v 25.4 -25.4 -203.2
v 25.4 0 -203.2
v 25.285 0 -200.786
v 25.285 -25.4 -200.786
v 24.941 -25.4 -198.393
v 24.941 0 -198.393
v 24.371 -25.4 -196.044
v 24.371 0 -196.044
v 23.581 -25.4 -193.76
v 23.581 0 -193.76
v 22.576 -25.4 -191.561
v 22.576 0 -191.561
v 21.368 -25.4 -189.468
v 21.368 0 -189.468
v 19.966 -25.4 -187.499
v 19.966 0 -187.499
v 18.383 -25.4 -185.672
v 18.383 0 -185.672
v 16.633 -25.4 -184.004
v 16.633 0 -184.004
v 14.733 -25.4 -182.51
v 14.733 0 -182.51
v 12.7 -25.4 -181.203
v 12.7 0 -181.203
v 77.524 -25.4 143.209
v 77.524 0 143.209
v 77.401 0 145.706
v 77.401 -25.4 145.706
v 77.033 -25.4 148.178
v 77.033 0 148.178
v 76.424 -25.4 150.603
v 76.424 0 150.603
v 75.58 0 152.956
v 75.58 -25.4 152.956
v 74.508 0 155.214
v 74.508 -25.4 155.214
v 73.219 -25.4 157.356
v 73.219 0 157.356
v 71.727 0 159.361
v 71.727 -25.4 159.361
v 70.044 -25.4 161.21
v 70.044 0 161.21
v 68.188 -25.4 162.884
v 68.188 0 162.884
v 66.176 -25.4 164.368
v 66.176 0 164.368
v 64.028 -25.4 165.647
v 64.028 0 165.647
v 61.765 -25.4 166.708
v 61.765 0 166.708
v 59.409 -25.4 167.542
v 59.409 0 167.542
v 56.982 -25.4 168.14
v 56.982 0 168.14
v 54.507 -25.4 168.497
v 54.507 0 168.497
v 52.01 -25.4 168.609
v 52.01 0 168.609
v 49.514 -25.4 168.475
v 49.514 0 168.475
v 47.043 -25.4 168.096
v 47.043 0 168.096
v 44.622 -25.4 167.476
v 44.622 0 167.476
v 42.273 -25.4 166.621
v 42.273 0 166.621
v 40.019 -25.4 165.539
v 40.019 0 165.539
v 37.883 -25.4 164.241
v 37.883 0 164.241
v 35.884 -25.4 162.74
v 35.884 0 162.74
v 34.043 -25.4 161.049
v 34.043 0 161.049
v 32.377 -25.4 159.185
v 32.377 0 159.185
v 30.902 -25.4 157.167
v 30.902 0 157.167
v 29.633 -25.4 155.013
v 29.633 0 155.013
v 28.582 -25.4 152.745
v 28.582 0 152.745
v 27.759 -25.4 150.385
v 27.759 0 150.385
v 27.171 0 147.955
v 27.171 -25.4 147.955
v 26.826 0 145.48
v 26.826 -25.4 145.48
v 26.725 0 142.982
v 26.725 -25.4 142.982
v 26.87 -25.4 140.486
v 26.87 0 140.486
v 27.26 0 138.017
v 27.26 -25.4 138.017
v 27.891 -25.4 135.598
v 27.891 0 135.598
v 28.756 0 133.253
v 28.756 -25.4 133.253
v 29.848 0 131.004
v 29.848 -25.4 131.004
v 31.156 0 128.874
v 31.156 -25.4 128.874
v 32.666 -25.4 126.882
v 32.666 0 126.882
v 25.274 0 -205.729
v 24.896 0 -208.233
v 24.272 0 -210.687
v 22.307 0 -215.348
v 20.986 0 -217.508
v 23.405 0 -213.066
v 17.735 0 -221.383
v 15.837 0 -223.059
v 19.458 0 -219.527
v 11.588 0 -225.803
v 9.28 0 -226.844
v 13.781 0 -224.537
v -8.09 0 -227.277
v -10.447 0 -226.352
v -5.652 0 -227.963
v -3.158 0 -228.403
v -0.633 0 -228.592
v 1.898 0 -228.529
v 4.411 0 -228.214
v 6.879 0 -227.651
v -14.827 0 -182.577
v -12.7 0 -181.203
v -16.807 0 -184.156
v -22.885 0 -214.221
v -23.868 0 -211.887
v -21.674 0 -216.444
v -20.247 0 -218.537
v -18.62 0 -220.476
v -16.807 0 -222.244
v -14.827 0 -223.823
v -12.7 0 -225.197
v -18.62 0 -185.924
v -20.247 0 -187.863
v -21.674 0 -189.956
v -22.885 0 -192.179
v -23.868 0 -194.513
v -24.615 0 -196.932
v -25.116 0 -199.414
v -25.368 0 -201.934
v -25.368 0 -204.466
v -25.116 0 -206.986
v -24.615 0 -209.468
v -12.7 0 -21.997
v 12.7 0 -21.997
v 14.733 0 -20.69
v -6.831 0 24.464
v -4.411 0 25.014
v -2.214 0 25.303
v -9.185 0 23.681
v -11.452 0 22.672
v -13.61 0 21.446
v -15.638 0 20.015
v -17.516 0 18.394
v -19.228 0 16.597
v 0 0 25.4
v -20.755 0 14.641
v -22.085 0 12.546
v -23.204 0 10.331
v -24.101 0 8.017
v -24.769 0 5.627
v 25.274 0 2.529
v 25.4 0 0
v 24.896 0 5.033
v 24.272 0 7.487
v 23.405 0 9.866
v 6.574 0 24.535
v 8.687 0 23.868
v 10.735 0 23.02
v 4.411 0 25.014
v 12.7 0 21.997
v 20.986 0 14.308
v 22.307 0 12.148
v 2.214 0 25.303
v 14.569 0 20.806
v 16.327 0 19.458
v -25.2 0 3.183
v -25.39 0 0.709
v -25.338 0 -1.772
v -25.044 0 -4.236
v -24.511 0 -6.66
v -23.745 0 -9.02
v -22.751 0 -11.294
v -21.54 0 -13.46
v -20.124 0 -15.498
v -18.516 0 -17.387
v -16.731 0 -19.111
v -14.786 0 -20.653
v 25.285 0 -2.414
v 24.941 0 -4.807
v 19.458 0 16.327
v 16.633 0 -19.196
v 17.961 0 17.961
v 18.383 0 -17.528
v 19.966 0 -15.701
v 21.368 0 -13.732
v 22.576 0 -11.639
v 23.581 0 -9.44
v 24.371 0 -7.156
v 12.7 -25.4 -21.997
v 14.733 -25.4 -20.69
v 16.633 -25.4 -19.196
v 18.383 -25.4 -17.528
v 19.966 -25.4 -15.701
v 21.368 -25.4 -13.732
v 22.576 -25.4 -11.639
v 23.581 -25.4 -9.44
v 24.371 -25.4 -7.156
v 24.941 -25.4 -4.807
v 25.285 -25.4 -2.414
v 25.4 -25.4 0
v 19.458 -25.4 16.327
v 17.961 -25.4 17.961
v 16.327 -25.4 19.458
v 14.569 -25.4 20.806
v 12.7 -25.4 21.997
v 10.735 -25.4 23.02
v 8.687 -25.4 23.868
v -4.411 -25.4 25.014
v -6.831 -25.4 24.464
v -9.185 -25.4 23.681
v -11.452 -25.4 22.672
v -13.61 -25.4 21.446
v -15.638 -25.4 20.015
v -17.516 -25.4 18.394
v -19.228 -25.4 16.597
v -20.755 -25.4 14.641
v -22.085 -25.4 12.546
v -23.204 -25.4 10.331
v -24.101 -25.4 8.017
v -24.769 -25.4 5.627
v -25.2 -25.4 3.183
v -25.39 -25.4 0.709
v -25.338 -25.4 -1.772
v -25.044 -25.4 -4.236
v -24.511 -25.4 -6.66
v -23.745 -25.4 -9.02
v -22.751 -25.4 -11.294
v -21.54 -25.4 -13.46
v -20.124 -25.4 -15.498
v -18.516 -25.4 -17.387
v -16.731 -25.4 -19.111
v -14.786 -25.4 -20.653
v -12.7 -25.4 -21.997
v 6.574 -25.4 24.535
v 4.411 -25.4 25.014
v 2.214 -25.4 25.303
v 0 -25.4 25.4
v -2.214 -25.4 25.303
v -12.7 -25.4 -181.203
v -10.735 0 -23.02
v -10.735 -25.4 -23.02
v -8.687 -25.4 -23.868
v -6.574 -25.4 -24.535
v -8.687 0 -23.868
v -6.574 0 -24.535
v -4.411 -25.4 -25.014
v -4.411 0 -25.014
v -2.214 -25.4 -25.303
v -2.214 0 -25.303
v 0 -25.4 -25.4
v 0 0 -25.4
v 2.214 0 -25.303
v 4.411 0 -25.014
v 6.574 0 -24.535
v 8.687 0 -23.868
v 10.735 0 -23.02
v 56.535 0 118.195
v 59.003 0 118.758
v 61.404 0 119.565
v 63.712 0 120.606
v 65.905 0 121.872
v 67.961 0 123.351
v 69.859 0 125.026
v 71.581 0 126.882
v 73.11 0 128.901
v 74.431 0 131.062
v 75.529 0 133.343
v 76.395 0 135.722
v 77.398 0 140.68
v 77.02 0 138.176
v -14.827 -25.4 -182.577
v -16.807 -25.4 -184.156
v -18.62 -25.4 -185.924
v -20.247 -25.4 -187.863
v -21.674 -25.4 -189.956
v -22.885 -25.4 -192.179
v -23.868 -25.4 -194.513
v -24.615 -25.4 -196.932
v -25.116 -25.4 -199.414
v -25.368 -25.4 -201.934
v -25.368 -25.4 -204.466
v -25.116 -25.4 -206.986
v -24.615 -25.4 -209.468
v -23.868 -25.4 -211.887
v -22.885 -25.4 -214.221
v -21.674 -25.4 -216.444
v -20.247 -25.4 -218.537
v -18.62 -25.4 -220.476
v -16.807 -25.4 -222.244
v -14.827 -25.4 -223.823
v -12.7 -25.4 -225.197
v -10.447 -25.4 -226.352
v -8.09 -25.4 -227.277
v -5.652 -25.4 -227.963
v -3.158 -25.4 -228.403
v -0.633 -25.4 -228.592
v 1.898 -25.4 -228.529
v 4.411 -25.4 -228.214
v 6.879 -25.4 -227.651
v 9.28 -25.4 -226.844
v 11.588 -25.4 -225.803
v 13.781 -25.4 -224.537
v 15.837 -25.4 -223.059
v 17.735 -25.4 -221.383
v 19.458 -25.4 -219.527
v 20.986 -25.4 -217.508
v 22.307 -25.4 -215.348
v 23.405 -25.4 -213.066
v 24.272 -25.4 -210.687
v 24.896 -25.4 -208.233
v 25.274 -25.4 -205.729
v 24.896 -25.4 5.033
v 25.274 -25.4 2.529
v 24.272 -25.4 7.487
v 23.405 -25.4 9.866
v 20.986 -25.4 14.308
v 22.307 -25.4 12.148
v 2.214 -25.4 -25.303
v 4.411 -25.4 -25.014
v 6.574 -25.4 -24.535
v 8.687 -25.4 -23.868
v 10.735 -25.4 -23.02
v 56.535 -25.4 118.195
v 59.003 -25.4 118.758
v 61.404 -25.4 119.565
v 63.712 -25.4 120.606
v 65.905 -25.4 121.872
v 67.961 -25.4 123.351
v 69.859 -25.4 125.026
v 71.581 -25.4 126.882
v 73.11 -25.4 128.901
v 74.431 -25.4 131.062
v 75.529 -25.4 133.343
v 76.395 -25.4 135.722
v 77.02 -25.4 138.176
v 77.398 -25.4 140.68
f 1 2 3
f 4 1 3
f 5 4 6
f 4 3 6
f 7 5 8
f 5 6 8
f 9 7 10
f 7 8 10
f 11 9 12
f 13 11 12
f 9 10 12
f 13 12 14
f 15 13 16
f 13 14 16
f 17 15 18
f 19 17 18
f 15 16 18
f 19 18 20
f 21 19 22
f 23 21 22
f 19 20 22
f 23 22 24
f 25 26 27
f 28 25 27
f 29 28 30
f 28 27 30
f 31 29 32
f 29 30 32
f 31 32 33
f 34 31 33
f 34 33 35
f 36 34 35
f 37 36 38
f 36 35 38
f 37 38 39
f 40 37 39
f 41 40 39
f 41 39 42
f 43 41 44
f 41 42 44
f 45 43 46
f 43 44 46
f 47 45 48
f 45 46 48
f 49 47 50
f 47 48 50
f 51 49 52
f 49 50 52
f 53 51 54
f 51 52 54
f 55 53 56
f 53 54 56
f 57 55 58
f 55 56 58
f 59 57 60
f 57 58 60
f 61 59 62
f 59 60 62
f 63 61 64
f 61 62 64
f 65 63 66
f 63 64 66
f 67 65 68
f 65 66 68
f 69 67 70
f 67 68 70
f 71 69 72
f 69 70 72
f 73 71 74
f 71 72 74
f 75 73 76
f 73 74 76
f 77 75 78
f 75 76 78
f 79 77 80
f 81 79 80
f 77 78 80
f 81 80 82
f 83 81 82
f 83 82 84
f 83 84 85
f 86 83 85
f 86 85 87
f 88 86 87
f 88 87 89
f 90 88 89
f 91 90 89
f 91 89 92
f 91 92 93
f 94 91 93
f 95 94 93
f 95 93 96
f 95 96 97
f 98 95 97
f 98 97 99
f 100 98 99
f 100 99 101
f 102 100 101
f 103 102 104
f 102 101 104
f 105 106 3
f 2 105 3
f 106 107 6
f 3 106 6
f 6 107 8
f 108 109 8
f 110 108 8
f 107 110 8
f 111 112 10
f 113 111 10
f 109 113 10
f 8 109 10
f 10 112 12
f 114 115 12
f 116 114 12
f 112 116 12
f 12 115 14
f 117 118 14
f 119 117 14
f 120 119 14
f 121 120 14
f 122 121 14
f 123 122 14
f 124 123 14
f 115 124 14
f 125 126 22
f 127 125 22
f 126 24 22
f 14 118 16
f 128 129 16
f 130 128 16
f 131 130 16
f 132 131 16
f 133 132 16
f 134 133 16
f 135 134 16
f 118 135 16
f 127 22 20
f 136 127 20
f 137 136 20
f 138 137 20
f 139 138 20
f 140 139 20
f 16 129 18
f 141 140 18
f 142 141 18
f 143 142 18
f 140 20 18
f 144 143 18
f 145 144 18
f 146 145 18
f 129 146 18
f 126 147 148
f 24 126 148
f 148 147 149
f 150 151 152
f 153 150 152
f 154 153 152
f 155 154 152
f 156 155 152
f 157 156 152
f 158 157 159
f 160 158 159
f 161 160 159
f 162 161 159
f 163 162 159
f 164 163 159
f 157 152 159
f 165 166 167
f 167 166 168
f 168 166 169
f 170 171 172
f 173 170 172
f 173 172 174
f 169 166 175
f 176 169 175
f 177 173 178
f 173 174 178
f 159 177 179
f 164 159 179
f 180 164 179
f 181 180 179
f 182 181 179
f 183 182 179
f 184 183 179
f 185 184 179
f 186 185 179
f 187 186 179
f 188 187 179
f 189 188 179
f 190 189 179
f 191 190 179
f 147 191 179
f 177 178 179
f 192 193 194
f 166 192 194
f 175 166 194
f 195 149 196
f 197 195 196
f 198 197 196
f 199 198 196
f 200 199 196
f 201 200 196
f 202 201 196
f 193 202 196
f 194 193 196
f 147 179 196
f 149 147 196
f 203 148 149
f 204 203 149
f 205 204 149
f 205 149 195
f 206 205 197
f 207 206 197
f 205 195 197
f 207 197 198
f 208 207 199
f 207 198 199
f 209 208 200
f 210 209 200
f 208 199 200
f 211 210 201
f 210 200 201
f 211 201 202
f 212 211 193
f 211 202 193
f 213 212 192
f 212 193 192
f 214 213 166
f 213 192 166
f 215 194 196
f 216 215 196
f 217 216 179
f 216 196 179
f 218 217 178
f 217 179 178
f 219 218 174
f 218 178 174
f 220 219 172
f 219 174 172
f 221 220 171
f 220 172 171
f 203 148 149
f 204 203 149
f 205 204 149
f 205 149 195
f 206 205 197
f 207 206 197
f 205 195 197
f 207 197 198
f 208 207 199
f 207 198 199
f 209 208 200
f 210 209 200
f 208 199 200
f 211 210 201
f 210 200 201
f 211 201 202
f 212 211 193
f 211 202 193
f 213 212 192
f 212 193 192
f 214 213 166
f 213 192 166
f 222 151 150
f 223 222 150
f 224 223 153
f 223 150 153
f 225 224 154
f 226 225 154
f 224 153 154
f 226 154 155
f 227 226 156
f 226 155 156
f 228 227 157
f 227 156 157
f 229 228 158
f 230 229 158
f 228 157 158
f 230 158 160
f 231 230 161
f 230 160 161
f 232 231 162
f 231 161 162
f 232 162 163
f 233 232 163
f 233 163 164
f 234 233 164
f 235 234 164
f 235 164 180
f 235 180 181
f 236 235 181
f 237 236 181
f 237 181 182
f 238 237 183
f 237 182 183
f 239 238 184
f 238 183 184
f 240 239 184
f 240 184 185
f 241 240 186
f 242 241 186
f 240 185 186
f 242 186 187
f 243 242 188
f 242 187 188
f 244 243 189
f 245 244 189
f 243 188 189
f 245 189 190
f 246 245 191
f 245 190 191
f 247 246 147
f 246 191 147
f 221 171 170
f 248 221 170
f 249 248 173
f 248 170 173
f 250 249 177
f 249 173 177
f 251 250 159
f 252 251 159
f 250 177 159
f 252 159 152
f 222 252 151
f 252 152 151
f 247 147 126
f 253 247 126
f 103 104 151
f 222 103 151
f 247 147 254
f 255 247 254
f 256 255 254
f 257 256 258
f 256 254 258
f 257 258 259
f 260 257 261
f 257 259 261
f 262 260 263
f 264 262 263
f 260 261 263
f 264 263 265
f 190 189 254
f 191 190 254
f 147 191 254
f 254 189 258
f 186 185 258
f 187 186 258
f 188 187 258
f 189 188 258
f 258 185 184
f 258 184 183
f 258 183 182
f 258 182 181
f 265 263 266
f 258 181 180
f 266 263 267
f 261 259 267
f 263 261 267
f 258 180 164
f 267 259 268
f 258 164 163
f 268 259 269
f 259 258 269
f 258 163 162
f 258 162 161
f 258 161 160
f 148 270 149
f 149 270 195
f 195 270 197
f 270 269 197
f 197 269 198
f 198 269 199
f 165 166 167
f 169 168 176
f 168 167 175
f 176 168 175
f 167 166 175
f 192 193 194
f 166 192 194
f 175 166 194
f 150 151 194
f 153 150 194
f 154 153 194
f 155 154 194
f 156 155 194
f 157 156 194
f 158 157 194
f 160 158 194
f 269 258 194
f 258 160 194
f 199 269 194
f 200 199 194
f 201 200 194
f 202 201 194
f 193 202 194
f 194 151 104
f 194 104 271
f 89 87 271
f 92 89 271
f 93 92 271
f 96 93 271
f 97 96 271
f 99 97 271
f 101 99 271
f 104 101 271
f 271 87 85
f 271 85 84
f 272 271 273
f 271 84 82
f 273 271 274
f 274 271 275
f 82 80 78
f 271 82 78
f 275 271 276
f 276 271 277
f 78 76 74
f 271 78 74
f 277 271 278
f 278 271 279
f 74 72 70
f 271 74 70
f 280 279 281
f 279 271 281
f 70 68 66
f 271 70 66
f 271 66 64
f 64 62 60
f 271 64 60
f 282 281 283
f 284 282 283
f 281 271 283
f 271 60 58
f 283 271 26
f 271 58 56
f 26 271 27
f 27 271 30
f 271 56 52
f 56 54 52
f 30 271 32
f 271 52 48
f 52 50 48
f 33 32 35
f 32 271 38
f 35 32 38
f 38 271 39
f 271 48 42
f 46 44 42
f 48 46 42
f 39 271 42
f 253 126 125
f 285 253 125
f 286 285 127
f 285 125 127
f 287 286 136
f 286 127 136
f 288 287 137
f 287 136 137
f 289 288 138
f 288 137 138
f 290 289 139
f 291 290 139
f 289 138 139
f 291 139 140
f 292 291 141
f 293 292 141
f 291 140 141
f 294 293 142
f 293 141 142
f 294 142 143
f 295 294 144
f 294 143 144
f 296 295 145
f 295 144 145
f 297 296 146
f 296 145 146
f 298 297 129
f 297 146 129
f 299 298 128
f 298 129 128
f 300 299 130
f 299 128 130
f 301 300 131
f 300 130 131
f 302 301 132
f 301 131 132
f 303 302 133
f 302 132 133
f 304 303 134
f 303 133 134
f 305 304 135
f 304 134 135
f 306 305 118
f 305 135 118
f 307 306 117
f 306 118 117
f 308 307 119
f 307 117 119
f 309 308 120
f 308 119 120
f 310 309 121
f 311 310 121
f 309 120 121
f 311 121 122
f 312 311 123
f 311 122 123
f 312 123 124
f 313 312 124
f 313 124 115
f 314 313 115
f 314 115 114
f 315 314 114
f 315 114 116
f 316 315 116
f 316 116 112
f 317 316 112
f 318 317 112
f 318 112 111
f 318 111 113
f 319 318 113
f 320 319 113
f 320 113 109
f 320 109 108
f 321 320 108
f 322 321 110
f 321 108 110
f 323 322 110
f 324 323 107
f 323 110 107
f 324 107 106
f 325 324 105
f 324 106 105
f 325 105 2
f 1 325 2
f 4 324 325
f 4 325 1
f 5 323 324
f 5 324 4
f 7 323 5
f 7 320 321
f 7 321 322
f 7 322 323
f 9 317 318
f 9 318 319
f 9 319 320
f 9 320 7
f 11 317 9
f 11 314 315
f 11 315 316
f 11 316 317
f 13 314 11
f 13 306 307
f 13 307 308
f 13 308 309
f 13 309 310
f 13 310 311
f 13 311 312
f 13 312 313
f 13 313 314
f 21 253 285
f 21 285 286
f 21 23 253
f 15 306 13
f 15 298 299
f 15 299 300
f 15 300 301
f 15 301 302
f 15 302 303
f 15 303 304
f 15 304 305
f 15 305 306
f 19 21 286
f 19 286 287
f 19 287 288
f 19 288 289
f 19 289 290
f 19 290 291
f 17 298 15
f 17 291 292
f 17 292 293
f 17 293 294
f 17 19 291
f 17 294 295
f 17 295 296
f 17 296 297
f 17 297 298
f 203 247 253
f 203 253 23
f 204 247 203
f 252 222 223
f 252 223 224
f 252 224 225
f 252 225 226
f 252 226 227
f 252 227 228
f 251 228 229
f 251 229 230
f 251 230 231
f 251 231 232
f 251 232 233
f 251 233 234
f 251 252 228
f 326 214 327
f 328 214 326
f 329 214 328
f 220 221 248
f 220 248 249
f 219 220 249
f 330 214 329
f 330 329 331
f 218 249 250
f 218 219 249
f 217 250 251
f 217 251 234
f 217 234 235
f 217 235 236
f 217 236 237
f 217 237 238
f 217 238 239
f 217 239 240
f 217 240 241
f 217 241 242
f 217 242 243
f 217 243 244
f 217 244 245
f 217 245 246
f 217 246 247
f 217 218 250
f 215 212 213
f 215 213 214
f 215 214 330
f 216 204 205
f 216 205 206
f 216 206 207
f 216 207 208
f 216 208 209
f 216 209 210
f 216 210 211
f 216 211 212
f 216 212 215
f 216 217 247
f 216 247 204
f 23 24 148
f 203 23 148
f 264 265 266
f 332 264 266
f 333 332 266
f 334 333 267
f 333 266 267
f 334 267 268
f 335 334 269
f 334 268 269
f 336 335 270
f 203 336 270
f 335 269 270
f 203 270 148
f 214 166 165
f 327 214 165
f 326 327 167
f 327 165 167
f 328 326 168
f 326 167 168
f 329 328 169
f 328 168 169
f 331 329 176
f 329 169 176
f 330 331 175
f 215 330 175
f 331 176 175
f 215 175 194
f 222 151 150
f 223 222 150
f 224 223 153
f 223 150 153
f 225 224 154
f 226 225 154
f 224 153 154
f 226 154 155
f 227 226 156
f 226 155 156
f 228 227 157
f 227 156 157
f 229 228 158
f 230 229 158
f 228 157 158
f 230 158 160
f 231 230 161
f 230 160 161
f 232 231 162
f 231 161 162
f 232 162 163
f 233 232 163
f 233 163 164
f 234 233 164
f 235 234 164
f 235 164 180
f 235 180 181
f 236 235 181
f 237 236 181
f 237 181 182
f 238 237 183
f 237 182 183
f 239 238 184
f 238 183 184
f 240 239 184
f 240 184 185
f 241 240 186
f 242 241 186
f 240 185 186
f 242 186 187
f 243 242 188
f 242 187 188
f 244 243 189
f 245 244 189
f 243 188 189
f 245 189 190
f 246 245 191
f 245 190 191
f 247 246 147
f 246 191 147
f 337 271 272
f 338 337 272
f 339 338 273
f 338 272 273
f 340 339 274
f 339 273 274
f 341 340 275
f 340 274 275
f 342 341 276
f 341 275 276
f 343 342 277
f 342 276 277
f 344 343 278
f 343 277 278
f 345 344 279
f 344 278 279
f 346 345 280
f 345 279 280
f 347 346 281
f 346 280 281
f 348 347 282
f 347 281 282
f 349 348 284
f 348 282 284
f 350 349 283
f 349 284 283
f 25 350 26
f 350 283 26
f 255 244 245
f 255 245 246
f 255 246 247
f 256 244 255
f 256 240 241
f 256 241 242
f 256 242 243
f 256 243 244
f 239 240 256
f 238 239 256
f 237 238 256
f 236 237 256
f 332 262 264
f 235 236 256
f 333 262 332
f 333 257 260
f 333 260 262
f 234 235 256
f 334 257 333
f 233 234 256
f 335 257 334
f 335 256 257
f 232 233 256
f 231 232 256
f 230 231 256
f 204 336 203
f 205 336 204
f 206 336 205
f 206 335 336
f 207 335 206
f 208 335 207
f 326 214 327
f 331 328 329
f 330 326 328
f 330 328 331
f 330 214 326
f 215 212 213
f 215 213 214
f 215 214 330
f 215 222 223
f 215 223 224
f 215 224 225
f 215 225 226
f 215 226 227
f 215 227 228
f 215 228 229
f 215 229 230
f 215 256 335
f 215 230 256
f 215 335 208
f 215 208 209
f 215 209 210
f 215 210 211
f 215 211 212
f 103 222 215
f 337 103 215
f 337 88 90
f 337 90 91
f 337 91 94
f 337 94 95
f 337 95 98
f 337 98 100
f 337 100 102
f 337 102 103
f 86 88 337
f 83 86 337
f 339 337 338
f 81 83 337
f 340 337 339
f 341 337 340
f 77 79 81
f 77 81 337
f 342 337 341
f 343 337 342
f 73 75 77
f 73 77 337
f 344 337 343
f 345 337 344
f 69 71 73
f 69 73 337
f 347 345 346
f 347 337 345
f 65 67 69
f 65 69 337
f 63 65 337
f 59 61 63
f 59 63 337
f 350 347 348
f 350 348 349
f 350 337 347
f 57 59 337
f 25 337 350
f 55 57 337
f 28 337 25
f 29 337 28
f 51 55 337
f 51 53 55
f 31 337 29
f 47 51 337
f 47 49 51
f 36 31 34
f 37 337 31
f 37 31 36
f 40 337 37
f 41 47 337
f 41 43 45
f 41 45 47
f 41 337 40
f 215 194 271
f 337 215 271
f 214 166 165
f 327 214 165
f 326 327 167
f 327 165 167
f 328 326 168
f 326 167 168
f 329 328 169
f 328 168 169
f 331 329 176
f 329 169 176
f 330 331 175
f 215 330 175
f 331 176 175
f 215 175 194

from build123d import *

# Parameters (mm, degrees)
F1_DEPTH = 25.4
F2_DEPTH = 25.4


with BuildPart() as f1:
    # F0 (on Front) → F1 (new body)
    with BuildSketch(Plane.XZ):
        with BuildLine():
            Line((12.7, -181.2029547439), (12.7, -21.9970452561))
            ThreePointArc((12.7, -21.9970452561), (6.5740037456, -24.5345159877), (0, -25.4))
            Line((0, -25.4), (0, -177.8))
            ThreePointArc((0, -177.8), (6.5740037456, -178.6654840123), (12.7, -181.2029547439))
        make_face()
        with BuildLine():
            ThreePointArc((25.4, -203.2), (21.9970452561, -190.5), (12.7, -181.2029547439))
            ThreePointArc((12.7, -181.2029547439), (6.5740037456, -178.6654840123), (0, -177.8))
            ThreePointArc((0, -177.8), (-6.5740037456, -178.6654840123), (-12.7, -181.2029547439))
            ThreePointArc((-12.7, -181.2029547439), (-12.7, -225.1970452561), (25.4, -203.2))
        make_face()
        with BuildLine():
            Line((0, -177.8), (0, -25.4))
            ThreePointArc((0, -25.4), (-6.5740037456, -24.5345159877), (-12.7, -21.9970452561))
            Line((-12.7, -21.9970452561), (-12.7, -181.2029547439))
            ThreePointArc((-12.7, -181.2029547439), (-6.5740037456, -178.6654840123), (0, -177.8))
        make_face()
        with BuildLine():
            Line((12.7, -2.239352655), (19.4575288552, 16.326805286))
            ThreePointArc((19.4575288552, 16.326805286), (14.5688414833, 20.8064619249), (8.6873116405, 23.868192568))
            Line((8.6873116405, 23.868192568), (0, 0))
            Line((0, 0), (0, -25.4))
            ThreePointArc((0, -25.4), (6.5740037456, -24.5345159877), (12.7, -21.9970452561))
            Line((12.7, -21.9970452561), (12.7, -2.239352655))
        make_face()
        with BuildLine():
            Line((0, 0), (8.6873116405, 23.868192568))
            ThreePointArc((8.6873116405, 23.868192568), (2.2137558658, 25.3033453315), (-4.4106637127, 25.0141169265))
            ThreePointArc((-4.4106637127, 25.0141169265), (-25.0141169265, 4.4106637127), (-12.7, -21.9970452561))
            ThreePointArc((-12.7, -21.9970452561), (-6.5740037456, -24.5345159877), (0, -25.4))
            Line((0, -25.4), (0, 0))
        make_face()
        with BuildLine():
            ThreePointArc((12.7, -21.9970452561), (21.9970452561, -12.7), (25.4, 0))
            ThreePointArc((25.4, 0), (23.868192568, 8.6873116405), (19.4575288552, 16.326805286))
            Line((19.4575288552, 16.326805286), (12.7, -2.239352655))
            Line((12.7, -2.239352655), (12.7, -21.9970452561))
        make_face()
    extrude(amount=F1_DEPTH)


with BuildPart() as f2:
    # F0 (on Front) → F2 (new body)
    with BuildSketch(Plane.XZ):
        with BuildLine():
            ThreePointArc((43.4365582024, 119.3409628398), (49.910113977, 117.9058100762), (56.5345335556, 118.1950384813))
            ThreePointArc((56.5345335556, 118.1950384813), (71.5813986981, 126.8823501217), (77.5238698428, 143.2091554078))
            ThreePointArc((77.5238698428, 143.2091554078), (43.4365582024, 167.0773479757), (32.6663409876, 126.8823501217))
            ThreePointArc((32.6663409876, 126.8823501217), (37.5550283595, 122.4026934828), (43.4365582024, 119.3409628398))
        make_face()
        with BuildLine():
            ThreePointArc((8.6873116405, 23.868192568), (14.5688414833, 20.8064619249), (19.4575288552, 16.326805286))
            Line((19.4575288552, 16.326805286), (56.5345335556, 118.1950384813))
            ThreePointArc((56.5345335556, 118.1950384813), (49.910113977, 117.9058100762), (43.4365582024, 119.3409628398))
            Line((43.4365582024, 119.3409628398), (8.6873116405, 23.868192568))
        make_face()
        with BuildLine():
            ThreePointArc((-4.4106637127, 25.0141169265), (2.2137558658, 25.3033453315), (8.6873116405, 23.868192568))
            Line((8.6873116405, 23.868192568), (43.4365582024, 119.3409628398))
            ThreePointArc((43.4365582024, 119.3409628398), (37.5550283595, 122.4026934828), (32.6663409876, 126.8823501217))
            Line((32.6663409876, 126.8823501217), (-4.4106637127, 25.0141169265))
        make_face()
        with BuildLine():
            ThreePointArc((12.7, -21.9970452561), (21.9970452561, -12.7), (25.4, 0))
            ThreePointArc((25.4, 0), (23.868192568, 8.6873116405), (19.4575288552, 16.326805286))
            Line((19.4575288552, 16.326805286), (12.7, -2.239352655))
            Line((12.7, -2.239352655), (12.7, -21.9970452561))
        make_face()
        with BuildLine():
            Line((12.7, -2.239352655), (19.4575288552, 16.326805286))
            ThreePointArc((19.4575288552, 16.326805286), (14.5688414833, 20.8064619249), (8.6873116405, 23.868192568))
            Line((8.6873116405, 23.868192568), (0, 0))
            Line((0, 0), (0, -25.4))
            ThreePointArc((0, -25.4), (6.5740037456, -24.5345159877), (12.7, -21.9970452561))
            Line((12.7, -21.9970452561), (12.7, -2.239352655))
        make_face()
        with BuildLine():
            Line((0, 0), (8.6873116405, 23.868192568))
            ThreePointArc((8.6873116405, 23.868192568), (2.2137558658, 25.3033453315), (-4.4106637127, 25.0141169265))
            ThreePointArc((-4.4106637127, 25.0141169265), (-25.0141169265, 4.4106637127), (-12.7, -21.9970452561))
            ThreePointArc((-12.7, -21.9970452561), (-6.5740037456, -24.5345159877), (0, -25.4))
            Line((0, -25.4), (0, 0))
        make_face()
    extrude(amount=F2_DEPTH)


solid = Compound([f1.part, f2.part])
